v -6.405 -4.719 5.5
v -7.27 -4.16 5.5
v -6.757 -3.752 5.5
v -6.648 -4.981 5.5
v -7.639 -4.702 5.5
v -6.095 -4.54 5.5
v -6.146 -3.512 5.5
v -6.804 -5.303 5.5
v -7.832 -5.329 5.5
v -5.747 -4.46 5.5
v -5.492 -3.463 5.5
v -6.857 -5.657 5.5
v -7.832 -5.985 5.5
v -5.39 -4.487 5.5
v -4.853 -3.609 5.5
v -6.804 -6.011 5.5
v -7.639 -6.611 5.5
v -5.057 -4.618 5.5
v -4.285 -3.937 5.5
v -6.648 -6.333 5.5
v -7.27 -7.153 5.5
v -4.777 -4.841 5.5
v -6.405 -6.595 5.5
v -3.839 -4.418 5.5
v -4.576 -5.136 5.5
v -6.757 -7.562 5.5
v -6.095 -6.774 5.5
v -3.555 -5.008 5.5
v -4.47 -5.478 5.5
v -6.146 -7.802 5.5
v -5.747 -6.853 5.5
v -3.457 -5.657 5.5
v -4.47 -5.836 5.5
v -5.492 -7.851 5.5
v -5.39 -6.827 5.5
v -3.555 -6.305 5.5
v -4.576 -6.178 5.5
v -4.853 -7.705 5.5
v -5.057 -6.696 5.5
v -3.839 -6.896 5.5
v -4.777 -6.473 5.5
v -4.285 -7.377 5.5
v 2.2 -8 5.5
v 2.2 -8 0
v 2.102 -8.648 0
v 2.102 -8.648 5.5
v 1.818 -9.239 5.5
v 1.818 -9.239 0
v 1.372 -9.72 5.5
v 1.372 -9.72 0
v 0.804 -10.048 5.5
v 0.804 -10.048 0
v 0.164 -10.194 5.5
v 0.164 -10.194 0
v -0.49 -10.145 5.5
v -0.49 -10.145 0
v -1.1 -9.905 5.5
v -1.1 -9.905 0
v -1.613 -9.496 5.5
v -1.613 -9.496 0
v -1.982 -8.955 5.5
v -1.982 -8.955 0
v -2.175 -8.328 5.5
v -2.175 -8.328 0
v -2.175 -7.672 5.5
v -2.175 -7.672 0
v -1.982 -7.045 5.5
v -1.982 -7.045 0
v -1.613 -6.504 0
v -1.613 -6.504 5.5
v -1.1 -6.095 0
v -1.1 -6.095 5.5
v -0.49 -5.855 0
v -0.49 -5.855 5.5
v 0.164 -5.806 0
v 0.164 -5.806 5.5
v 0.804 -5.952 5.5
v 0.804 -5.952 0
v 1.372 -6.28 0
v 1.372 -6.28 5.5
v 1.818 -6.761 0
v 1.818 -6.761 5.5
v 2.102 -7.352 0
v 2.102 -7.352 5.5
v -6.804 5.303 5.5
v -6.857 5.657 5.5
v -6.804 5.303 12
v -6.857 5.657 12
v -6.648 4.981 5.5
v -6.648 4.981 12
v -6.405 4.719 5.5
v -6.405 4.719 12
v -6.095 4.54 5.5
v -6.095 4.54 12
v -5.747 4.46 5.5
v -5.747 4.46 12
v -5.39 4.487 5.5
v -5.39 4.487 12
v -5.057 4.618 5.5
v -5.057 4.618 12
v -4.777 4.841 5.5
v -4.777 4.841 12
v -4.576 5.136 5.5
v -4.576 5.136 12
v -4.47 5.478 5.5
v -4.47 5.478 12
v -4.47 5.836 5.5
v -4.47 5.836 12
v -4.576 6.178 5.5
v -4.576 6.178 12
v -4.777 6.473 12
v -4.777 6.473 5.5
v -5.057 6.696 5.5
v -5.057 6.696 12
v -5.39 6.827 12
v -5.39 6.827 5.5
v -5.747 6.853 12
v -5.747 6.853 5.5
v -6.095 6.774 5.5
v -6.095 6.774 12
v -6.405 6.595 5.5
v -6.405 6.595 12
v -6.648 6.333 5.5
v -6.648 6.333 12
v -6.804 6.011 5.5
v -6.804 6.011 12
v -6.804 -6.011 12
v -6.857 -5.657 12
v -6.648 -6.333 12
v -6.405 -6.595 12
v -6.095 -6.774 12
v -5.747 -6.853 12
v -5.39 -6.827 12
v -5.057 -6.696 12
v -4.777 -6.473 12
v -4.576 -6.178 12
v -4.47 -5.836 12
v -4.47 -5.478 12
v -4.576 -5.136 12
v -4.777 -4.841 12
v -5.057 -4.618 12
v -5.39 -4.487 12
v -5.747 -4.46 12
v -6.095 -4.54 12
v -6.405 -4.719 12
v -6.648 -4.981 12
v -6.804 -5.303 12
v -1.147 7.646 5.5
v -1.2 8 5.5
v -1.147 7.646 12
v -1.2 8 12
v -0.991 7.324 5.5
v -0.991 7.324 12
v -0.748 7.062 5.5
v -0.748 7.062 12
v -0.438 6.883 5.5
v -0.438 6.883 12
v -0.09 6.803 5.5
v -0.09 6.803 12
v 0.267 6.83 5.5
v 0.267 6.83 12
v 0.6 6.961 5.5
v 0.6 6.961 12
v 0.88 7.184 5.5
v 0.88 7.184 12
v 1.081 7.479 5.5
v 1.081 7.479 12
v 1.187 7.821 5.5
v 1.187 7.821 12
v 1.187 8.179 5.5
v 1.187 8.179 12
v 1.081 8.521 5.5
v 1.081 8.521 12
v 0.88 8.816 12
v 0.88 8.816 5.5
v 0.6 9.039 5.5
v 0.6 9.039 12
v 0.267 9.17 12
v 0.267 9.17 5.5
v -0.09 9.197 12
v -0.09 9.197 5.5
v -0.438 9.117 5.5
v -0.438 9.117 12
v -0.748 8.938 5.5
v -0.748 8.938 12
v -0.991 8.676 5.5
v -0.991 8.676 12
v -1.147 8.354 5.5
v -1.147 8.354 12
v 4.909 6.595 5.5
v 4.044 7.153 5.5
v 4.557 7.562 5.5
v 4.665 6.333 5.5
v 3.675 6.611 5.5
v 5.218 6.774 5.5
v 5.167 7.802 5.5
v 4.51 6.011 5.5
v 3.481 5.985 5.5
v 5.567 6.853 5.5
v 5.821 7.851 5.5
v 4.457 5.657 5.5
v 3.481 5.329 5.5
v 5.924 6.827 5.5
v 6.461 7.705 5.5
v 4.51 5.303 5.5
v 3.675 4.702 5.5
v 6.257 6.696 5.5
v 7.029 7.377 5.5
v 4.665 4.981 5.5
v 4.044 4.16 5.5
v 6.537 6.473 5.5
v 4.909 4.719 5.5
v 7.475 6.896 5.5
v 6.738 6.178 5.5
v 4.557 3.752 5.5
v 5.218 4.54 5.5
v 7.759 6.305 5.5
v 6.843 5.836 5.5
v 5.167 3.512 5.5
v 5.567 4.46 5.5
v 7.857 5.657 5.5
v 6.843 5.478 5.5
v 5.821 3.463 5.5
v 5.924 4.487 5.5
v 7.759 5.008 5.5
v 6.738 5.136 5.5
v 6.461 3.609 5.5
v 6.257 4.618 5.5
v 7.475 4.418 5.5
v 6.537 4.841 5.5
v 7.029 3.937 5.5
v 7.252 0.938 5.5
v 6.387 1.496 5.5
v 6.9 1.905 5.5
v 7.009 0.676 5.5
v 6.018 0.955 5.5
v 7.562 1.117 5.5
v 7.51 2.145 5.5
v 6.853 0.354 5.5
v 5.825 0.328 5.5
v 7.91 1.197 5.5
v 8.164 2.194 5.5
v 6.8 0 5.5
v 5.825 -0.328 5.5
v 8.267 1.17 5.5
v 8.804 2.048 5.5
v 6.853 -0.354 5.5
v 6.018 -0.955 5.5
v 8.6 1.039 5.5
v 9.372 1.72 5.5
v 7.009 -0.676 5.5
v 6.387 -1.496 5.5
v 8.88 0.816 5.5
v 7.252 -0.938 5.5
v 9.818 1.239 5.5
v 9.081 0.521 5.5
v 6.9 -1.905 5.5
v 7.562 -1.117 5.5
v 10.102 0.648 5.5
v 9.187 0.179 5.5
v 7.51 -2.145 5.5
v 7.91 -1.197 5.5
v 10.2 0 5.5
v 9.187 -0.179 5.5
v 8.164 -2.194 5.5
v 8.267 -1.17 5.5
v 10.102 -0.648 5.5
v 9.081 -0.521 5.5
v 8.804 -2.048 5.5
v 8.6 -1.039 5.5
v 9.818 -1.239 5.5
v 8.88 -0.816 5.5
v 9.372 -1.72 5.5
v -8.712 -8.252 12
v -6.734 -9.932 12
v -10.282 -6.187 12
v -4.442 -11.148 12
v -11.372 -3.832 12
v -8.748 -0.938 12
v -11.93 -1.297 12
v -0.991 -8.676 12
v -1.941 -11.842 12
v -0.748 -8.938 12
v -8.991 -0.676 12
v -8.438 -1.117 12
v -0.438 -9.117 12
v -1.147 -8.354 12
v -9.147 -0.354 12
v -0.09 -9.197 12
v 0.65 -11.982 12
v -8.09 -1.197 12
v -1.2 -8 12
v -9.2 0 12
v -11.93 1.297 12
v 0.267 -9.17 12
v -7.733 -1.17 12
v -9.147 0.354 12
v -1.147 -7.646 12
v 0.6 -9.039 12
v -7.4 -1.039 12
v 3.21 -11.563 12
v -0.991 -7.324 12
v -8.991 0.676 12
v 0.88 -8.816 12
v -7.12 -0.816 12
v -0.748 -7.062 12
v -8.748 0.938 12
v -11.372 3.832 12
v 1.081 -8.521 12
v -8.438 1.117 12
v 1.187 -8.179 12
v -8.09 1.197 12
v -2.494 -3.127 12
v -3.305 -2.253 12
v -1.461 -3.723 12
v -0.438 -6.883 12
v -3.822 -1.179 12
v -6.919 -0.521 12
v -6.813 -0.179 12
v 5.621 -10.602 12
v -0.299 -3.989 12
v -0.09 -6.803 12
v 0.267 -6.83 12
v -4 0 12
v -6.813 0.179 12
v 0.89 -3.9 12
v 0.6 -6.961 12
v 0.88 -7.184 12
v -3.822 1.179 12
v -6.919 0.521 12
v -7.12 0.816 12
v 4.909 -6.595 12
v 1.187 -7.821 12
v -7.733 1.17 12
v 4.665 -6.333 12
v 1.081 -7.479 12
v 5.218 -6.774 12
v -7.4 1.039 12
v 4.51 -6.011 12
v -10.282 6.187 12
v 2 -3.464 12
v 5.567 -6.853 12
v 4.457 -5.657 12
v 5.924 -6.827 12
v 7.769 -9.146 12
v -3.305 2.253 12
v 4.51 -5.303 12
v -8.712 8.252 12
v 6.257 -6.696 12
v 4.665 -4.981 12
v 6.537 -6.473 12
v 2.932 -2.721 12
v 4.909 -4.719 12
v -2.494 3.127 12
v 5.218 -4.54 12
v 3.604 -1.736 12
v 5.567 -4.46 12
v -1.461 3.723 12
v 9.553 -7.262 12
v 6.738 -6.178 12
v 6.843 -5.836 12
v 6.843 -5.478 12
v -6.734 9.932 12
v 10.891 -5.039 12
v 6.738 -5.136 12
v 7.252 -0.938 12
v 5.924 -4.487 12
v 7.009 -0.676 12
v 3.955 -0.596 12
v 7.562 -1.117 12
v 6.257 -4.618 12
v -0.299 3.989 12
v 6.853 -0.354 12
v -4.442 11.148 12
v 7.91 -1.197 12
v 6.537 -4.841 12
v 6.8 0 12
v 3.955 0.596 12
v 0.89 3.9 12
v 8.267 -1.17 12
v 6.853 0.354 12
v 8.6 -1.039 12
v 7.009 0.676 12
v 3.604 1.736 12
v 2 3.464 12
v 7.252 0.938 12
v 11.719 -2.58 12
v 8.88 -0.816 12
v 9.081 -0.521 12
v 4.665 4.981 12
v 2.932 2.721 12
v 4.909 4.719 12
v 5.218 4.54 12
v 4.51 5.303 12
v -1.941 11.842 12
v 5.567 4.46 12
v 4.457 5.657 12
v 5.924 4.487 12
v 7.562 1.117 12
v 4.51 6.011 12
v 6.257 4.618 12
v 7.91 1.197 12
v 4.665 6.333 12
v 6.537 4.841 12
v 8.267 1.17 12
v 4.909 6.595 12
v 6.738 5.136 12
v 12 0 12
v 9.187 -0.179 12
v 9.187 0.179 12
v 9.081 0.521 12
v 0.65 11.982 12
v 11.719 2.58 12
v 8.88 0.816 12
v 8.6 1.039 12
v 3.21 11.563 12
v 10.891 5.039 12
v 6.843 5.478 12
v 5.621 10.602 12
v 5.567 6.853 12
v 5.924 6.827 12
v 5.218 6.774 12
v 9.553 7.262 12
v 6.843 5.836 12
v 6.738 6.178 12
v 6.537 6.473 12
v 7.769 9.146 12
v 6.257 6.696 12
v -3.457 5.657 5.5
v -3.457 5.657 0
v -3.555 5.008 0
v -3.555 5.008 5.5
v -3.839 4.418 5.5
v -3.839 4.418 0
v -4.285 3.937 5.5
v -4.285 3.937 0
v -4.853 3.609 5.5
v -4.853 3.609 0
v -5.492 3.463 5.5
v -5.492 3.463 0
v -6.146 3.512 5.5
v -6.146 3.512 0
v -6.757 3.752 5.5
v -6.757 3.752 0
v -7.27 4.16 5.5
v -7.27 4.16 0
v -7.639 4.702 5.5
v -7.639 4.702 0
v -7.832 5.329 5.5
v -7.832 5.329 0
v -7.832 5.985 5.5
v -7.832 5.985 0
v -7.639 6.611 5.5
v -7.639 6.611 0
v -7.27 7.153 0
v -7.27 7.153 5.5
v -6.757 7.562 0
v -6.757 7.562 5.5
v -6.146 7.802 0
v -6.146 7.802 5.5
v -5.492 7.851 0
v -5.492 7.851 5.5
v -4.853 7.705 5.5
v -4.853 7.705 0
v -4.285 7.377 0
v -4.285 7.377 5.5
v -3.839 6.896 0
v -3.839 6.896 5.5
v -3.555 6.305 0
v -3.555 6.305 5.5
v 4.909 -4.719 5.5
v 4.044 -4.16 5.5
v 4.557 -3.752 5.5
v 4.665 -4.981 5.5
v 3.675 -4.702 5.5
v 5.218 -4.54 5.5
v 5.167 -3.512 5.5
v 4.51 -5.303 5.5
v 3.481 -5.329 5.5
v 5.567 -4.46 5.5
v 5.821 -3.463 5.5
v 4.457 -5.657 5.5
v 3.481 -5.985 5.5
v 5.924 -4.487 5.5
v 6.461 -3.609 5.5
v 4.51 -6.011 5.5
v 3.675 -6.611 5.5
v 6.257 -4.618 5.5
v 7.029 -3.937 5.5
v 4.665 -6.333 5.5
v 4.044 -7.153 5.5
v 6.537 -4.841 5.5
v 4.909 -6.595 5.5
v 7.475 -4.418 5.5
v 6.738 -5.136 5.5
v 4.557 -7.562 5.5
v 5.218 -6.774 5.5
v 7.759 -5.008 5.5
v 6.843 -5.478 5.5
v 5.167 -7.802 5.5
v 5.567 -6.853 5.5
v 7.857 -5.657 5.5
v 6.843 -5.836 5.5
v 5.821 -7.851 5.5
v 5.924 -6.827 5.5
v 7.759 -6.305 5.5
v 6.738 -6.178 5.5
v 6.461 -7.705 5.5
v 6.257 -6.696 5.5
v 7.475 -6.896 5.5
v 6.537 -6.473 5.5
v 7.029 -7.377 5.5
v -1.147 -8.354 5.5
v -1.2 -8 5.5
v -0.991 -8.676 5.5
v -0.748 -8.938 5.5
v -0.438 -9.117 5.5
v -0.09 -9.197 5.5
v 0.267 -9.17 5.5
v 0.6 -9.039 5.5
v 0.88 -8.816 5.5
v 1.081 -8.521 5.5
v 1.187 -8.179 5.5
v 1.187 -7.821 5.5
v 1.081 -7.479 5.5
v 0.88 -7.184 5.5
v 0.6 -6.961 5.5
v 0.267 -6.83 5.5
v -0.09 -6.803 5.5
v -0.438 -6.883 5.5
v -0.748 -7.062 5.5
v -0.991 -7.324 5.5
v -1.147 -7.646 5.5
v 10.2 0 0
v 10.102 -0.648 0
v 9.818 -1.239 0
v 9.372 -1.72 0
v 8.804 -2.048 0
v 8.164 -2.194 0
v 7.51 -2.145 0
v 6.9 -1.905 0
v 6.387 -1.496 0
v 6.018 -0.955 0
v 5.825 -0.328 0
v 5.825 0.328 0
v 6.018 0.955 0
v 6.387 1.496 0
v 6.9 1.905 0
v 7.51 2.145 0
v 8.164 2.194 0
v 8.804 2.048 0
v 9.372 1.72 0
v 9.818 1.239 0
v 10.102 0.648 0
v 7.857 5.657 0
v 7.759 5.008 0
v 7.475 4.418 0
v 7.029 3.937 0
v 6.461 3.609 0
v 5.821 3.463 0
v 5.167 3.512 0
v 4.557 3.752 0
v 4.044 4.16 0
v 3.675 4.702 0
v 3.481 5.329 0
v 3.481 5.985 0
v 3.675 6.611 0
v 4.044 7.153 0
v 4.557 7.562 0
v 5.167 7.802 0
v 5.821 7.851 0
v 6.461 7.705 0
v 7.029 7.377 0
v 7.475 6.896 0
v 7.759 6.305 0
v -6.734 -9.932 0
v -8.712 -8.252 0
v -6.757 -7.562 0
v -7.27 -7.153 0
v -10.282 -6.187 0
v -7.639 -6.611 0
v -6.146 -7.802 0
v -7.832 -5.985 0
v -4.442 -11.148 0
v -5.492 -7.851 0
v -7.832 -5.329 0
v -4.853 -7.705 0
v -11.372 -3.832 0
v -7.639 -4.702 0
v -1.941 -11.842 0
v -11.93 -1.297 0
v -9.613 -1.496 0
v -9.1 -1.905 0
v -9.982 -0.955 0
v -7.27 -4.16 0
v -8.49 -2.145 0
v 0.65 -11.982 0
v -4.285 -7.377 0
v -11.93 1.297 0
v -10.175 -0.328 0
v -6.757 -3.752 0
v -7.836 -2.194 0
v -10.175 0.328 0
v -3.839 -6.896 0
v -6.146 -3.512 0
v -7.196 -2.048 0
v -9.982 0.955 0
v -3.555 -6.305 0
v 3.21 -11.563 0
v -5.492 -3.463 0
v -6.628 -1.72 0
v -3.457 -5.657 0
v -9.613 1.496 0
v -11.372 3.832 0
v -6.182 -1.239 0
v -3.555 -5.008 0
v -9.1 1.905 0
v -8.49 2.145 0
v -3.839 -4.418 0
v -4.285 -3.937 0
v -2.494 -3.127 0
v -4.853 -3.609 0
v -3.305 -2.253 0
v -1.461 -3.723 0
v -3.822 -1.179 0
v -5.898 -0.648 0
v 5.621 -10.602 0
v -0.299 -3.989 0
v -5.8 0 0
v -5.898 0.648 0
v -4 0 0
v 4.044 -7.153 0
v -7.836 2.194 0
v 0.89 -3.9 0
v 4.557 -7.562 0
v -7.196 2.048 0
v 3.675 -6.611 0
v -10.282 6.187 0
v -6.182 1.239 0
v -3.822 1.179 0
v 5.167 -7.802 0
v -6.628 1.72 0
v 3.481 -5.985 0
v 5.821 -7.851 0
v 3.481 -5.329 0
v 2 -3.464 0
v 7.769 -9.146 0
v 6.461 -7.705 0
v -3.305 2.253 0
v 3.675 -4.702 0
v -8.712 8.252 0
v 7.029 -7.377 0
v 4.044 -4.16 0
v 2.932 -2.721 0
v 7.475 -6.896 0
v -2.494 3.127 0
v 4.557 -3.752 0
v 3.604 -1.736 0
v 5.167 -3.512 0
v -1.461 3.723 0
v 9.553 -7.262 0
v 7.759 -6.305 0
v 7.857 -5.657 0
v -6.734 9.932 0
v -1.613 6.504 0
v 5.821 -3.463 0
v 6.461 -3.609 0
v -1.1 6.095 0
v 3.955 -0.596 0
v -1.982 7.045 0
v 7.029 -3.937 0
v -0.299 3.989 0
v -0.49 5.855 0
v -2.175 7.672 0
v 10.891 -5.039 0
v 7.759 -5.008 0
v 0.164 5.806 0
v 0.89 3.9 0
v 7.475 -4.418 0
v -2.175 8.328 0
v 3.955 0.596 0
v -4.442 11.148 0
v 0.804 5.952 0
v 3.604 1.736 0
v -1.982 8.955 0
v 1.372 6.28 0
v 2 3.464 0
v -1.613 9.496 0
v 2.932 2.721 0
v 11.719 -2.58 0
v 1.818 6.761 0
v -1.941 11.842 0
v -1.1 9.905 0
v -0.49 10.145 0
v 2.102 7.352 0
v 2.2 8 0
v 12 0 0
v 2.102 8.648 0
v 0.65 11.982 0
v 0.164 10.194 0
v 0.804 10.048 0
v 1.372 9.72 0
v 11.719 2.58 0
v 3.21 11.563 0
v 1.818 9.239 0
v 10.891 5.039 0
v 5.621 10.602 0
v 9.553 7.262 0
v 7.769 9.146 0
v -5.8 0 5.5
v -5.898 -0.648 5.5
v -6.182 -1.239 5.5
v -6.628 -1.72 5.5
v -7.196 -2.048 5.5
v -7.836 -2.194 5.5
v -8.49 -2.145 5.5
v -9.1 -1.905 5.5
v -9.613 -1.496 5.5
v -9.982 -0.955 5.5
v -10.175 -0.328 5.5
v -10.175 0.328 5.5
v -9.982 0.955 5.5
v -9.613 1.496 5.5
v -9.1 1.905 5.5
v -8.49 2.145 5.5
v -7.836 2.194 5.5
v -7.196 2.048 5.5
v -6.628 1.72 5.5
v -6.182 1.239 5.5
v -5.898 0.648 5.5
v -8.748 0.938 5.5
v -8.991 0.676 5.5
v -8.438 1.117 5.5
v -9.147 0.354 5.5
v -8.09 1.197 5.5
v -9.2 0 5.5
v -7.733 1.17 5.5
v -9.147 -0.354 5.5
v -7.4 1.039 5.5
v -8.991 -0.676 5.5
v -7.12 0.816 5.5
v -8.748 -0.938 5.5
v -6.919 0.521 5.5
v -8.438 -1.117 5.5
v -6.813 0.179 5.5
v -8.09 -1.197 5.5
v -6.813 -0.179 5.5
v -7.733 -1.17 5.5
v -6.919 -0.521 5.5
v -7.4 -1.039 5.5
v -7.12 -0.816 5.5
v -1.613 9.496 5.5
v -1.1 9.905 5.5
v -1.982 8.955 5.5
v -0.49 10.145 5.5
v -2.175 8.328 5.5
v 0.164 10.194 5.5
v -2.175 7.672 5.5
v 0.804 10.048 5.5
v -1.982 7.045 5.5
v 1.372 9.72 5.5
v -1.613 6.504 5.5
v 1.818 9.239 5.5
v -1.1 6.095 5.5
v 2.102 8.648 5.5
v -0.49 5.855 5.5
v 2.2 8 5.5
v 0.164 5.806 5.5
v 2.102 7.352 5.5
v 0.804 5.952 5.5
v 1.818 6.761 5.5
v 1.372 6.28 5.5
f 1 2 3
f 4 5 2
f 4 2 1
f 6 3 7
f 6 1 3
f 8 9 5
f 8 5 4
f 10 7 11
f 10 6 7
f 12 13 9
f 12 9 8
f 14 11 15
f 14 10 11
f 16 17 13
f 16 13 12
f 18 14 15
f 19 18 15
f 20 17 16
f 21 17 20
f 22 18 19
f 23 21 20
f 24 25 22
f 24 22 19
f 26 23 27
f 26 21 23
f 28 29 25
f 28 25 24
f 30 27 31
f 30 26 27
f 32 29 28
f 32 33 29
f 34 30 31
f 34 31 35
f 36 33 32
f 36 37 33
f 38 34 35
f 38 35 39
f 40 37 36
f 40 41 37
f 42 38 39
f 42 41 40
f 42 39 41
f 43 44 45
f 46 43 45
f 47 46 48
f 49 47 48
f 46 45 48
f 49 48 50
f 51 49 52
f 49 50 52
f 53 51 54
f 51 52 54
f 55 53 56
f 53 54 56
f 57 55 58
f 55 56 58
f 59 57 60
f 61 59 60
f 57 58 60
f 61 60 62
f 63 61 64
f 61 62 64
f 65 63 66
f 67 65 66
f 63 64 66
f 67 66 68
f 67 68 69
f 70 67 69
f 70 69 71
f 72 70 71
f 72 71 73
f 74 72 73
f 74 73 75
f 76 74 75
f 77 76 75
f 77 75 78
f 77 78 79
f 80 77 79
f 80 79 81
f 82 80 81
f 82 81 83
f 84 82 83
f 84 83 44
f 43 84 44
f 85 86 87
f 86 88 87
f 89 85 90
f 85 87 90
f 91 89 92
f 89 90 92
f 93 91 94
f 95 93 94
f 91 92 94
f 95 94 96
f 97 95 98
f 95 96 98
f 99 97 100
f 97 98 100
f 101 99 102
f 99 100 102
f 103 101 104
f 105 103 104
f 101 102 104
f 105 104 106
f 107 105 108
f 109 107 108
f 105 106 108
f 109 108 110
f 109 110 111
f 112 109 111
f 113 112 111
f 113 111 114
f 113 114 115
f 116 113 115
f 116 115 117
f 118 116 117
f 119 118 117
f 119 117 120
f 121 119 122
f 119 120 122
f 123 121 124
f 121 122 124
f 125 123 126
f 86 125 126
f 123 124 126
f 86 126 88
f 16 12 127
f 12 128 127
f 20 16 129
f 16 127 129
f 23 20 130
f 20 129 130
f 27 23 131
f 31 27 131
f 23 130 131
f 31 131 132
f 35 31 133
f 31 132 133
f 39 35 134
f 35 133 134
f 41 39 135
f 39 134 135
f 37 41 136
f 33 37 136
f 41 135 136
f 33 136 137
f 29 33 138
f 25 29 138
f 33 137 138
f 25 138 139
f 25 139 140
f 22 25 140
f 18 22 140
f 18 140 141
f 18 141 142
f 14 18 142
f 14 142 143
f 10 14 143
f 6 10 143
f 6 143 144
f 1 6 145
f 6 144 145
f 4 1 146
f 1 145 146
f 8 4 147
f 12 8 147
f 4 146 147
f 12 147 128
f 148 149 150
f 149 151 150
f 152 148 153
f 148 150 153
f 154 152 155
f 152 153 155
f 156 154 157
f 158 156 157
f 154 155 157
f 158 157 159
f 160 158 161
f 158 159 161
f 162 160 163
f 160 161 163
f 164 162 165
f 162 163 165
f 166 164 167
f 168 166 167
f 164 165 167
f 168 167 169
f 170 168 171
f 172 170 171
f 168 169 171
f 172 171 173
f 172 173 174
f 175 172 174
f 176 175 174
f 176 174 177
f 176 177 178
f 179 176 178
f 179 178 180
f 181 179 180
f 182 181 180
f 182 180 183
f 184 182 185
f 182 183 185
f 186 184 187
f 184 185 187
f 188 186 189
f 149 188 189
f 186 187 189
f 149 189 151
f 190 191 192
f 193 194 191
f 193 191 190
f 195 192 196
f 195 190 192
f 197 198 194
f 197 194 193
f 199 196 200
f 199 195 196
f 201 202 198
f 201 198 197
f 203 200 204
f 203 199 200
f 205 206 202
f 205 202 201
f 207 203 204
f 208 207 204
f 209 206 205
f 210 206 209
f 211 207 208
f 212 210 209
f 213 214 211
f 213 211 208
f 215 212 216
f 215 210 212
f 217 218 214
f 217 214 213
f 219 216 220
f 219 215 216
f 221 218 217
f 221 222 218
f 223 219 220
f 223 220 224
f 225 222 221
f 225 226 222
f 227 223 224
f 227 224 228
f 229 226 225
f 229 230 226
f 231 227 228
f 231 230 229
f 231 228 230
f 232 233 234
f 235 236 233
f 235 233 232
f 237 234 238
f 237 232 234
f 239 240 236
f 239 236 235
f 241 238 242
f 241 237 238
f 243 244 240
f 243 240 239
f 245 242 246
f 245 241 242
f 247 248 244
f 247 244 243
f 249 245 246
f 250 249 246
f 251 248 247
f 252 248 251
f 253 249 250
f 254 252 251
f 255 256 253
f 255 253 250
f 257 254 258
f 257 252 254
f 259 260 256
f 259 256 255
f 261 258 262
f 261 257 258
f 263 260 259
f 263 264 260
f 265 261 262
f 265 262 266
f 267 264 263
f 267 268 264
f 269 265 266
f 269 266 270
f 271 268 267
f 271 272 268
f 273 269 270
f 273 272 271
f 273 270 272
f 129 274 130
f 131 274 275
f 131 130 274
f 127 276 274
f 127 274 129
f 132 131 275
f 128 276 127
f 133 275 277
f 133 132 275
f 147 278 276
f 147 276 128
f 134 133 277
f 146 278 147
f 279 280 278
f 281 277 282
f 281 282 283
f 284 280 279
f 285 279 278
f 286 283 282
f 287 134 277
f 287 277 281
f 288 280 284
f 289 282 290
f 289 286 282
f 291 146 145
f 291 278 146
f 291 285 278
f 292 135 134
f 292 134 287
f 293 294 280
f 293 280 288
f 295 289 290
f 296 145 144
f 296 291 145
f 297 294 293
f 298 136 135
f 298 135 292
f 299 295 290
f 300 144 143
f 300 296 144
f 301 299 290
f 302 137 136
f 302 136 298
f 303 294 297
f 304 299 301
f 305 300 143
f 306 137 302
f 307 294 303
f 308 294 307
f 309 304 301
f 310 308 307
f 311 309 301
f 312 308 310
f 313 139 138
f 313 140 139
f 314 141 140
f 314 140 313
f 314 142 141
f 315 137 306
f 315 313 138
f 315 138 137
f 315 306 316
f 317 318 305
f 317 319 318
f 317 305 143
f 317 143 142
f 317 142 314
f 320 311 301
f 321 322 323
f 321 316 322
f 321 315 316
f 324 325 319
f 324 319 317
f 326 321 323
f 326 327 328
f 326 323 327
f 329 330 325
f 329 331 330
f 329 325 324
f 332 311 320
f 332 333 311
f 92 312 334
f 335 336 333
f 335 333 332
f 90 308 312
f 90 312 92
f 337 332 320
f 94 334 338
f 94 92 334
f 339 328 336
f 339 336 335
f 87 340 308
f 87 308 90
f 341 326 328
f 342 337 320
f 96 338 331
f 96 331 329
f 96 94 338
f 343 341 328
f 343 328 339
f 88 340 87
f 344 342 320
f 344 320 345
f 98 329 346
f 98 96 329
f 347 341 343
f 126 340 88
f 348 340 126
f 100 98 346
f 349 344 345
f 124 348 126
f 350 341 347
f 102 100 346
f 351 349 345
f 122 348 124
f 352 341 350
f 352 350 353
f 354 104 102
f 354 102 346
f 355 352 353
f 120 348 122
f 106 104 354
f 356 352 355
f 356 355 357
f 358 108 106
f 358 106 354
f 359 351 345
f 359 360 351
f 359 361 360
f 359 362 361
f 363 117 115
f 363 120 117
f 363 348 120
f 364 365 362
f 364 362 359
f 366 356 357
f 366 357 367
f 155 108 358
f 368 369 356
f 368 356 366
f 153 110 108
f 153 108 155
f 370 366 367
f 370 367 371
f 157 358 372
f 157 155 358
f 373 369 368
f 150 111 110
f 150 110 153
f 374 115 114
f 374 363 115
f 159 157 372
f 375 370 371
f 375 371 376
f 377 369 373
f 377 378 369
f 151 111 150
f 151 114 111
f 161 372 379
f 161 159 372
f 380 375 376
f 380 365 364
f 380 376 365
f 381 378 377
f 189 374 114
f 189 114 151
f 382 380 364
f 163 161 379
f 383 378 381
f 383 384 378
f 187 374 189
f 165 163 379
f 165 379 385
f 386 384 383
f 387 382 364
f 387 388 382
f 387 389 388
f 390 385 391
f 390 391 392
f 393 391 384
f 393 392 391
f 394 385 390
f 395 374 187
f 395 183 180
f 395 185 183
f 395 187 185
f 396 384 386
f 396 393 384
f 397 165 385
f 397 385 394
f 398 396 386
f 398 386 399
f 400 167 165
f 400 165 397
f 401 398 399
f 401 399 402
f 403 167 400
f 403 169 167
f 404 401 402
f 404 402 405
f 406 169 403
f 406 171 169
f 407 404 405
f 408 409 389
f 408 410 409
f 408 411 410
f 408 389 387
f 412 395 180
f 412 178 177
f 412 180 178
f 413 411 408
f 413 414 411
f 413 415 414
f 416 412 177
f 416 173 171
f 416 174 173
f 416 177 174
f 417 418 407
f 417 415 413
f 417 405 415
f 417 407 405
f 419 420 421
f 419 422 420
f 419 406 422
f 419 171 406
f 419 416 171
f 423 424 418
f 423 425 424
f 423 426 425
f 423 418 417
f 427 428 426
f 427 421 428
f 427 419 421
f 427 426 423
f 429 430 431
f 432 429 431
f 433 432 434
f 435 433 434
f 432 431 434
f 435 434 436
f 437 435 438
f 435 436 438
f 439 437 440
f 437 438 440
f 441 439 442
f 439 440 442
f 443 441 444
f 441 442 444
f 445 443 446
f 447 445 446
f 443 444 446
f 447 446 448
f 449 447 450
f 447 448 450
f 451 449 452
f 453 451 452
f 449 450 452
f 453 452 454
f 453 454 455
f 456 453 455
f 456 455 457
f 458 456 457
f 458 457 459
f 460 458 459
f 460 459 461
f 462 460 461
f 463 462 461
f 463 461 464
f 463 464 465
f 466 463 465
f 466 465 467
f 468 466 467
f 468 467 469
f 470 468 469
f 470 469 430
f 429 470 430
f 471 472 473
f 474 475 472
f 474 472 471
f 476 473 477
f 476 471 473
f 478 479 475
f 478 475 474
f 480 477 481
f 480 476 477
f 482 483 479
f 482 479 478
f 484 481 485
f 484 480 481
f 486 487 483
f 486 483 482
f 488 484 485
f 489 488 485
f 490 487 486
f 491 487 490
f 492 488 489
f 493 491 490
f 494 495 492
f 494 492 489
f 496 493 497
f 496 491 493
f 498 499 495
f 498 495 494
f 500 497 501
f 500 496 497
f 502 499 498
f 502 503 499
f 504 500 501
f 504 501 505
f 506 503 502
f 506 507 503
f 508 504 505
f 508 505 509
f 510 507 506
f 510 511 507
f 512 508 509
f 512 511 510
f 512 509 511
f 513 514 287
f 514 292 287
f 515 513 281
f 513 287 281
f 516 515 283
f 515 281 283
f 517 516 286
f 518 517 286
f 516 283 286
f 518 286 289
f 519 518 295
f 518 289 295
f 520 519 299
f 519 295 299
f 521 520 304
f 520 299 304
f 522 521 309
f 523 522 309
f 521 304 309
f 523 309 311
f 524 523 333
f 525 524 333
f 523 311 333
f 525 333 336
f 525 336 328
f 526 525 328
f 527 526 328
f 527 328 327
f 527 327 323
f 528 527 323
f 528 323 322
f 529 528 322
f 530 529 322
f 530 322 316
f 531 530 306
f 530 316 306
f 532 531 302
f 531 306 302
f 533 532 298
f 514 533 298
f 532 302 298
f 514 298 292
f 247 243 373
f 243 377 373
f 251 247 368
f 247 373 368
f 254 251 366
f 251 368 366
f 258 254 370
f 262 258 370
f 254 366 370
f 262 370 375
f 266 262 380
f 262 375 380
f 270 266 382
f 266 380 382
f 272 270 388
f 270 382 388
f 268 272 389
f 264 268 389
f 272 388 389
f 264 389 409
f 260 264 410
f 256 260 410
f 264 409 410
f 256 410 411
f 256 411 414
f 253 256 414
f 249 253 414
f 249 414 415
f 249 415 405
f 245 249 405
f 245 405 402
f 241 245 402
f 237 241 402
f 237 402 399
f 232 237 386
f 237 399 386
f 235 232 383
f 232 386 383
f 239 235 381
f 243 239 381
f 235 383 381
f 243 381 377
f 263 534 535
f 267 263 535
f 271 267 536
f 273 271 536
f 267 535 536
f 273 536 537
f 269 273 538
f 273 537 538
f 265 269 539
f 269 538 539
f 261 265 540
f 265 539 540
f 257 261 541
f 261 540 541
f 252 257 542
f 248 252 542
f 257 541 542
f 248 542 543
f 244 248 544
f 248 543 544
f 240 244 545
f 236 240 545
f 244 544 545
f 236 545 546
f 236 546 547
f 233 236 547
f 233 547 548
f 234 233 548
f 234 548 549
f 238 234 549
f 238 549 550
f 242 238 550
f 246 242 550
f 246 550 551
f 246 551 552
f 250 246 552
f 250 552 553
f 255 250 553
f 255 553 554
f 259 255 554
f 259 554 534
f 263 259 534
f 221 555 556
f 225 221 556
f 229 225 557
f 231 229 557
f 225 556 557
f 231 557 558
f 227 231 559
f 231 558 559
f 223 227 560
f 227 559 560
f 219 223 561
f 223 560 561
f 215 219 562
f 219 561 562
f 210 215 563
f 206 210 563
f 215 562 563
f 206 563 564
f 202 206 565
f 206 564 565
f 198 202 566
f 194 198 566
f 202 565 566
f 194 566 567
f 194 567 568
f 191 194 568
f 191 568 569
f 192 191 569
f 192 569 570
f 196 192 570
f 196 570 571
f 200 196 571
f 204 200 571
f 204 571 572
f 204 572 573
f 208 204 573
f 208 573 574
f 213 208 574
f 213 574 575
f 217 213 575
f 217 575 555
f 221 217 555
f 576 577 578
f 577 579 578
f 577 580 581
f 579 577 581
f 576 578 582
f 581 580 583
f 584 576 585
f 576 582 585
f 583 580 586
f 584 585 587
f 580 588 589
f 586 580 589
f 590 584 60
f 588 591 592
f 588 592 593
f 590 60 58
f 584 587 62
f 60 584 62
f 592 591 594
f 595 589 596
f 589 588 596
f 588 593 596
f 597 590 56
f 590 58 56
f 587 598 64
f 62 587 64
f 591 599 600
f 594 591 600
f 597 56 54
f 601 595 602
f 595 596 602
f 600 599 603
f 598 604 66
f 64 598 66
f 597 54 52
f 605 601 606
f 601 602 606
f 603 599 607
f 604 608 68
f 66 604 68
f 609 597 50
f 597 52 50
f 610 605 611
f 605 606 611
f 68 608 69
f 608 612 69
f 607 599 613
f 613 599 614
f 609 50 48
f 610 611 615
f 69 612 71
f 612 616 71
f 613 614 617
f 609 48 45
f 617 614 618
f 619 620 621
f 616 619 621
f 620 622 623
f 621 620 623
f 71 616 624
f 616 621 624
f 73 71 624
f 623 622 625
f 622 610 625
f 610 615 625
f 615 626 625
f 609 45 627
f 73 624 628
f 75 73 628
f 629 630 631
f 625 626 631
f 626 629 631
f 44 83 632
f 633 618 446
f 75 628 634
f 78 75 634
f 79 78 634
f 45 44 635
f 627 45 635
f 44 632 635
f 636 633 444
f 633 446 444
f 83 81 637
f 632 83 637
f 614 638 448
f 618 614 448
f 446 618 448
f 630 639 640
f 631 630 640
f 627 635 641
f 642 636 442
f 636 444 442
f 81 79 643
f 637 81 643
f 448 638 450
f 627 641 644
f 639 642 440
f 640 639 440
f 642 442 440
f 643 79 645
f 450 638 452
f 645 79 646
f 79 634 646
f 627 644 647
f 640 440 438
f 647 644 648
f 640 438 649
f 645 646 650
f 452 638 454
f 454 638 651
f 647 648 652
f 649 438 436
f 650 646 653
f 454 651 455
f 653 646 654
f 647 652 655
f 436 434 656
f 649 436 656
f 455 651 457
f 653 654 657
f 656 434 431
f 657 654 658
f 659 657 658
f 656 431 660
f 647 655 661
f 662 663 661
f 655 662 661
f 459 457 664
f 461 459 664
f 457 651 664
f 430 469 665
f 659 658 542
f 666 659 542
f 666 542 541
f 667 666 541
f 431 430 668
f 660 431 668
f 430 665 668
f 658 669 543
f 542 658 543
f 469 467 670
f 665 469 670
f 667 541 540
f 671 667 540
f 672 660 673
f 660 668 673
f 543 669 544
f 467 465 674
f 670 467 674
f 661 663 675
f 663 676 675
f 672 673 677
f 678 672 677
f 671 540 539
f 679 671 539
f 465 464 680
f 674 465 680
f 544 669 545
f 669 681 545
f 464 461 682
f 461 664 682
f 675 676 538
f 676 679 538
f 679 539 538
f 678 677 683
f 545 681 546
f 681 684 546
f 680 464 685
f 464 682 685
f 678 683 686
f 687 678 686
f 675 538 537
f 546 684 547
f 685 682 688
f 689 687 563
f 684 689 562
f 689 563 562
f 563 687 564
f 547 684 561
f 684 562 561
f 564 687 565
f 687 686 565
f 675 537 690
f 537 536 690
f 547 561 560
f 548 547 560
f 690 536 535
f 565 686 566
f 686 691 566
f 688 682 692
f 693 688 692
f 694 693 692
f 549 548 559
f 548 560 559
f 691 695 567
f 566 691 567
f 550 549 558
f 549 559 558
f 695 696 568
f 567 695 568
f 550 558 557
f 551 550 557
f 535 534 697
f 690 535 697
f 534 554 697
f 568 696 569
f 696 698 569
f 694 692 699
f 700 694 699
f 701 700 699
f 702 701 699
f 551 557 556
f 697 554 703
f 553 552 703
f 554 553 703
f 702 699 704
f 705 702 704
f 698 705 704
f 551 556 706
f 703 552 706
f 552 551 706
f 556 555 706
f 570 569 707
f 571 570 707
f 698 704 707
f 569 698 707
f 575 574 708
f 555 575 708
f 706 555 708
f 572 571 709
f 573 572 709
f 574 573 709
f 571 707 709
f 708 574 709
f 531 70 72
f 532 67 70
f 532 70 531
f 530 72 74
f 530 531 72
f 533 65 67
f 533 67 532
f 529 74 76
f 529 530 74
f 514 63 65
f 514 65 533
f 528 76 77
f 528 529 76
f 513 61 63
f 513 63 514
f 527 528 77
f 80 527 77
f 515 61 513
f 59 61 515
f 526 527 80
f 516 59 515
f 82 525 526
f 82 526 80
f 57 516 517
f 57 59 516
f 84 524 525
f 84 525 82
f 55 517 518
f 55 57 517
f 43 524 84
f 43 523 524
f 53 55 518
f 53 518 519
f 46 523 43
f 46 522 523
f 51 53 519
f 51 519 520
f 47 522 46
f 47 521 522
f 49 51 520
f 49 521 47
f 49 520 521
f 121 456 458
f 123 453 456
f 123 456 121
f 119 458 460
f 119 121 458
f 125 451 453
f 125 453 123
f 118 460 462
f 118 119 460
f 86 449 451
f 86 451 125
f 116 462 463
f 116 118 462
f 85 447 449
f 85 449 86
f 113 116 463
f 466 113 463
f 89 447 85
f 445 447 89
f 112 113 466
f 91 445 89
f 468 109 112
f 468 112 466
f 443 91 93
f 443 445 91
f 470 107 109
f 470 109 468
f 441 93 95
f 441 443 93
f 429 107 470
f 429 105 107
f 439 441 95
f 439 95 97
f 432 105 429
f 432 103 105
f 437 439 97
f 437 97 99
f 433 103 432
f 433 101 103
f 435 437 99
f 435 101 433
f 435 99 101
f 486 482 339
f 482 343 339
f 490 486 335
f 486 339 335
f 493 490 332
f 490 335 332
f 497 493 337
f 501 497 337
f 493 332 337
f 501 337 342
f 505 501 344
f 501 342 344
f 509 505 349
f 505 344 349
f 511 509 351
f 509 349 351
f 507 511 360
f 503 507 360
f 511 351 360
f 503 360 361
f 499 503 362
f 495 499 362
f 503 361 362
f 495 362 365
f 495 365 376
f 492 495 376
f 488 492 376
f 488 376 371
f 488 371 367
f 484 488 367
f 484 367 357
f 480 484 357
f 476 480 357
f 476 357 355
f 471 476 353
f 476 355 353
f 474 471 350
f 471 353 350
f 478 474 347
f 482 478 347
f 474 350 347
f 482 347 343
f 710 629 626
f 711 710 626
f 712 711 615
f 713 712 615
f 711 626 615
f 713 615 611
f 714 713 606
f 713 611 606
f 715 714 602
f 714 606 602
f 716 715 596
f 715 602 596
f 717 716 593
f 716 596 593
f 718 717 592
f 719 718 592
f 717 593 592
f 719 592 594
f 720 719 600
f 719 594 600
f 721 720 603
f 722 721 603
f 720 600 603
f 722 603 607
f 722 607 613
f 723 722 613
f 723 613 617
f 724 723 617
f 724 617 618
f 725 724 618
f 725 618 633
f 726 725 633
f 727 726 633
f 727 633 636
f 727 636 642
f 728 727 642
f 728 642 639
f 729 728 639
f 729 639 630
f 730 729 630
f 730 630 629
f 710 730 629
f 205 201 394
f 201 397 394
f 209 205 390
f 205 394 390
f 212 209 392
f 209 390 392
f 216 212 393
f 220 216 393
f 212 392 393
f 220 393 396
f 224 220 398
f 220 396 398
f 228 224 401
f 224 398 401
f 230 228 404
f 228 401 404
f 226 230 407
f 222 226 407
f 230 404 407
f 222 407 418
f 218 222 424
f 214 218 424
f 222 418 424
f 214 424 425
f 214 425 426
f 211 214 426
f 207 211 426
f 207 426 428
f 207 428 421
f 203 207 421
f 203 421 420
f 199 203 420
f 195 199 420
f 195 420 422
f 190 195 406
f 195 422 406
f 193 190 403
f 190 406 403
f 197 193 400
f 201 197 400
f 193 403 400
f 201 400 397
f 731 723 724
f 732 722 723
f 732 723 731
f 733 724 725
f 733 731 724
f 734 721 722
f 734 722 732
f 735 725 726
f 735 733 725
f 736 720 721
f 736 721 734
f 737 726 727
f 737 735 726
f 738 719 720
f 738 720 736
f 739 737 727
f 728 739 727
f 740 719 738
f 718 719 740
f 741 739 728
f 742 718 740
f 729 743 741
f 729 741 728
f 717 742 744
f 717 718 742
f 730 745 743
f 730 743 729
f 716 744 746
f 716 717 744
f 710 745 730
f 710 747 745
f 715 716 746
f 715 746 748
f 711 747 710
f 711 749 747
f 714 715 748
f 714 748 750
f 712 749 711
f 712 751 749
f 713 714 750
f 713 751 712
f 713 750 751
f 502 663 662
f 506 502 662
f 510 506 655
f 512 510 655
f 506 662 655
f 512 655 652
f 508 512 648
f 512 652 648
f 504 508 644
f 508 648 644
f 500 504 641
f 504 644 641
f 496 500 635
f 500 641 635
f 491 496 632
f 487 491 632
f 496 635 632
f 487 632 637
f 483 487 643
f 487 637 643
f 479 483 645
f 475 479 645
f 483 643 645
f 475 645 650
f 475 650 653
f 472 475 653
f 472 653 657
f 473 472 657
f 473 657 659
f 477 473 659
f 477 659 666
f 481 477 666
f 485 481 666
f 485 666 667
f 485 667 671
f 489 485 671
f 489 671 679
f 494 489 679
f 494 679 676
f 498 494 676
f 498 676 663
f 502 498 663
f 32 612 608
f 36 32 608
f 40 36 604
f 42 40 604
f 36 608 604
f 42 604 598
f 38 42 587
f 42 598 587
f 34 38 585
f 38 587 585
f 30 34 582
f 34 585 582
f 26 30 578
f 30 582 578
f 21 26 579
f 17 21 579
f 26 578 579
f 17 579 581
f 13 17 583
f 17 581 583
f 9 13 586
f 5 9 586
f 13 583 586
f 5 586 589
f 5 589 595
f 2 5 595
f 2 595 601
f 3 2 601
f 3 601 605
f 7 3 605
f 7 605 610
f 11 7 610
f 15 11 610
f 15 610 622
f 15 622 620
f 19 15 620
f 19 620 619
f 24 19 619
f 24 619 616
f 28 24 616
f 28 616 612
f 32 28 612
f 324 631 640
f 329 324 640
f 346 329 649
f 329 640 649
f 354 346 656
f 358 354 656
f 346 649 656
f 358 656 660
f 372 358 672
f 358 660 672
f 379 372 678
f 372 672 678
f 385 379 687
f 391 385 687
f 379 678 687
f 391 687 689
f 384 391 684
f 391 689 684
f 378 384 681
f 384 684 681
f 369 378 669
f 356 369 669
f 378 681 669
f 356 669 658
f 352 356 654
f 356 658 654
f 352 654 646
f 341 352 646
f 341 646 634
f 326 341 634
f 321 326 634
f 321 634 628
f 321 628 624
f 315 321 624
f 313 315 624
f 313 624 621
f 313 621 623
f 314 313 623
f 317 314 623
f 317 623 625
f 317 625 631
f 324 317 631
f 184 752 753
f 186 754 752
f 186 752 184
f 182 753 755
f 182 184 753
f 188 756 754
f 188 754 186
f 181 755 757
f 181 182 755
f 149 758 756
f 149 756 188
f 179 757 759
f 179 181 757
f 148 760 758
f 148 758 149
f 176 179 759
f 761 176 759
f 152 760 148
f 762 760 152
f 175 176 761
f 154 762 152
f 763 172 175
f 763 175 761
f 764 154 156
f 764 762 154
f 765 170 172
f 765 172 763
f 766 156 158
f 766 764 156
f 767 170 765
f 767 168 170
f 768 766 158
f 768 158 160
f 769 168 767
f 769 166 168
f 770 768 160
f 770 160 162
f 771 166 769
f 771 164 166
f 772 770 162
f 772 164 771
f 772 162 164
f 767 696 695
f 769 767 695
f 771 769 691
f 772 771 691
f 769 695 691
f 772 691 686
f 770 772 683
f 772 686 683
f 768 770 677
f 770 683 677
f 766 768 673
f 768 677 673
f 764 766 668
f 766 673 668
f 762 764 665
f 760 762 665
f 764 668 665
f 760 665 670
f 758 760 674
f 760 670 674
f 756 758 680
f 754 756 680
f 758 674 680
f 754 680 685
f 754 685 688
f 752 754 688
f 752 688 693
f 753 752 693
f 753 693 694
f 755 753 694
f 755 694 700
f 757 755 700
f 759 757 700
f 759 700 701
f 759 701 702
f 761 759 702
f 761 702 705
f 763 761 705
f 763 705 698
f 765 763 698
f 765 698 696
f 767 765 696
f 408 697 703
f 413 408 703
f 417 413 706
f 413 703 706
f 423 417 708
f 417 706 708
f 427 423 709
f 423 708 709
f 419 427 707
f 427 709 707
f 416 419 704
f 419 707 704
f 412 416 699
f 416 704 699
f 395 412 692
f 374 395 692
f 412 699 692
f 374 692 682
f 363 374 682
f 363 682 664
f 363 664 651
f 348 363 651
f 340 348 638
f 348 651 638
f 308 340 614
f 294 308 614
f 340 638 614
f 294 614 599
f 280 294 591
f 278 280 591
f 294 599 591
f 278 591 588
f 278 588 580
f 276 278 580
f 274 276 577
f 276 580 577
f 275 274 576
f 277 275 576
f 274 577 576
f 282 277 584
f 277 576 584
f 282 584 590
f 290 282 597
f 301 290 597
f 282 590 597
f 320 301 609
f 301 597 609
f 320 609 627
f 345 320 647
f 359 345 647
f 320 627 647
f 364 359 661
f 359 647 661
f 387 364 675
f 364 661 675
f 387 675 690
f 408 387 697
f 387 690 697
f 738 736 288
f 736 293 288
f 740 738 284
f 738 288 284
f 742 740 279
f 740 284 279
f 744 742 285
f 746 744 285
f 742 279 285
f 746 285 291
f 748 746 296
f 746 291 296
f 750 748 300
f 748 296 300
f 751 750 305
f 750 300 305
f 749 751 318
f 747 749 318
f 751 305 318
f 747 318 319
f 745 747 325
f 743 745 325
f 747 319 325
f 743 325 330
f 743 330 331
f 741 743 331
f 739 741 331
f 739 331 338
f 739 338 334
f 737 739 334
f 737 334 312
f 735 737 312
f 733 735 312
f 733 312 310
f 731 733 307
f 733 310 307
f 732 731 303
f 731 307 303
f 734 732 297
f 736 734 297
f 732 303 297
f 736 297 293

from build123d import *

# Parameters (mm, degrees)
SKETCH1_R                                           = 12
BOSS_EXTRUDE1_DEPTH                                 = 12
F_8_0MM_DOWEL_HOLE1_D                               = 8
CBORE_FOR_M2_HEX_SOCKET_HEAD_CAP_SCREW1_D           = 2.4
CBORE_FOR_M2_HEX_SOCKET_HEAD_CAP_SCREW1_CBORE_D     = 4.4
CBORE_FOR_M2_HEX_SOCKET_HEAD_CAP_SCREW1_CBORE_DEPTH = 5.5


with BuildPart() as part:
    # Sketch1 → Boss-Extrude1 (new body)
    with BuildSketch(Plane.XY):
        Circle(SKETCH1_R)
    extrude(amount=BOSS_EXTRUDE1_DEPTH)

    # Ø8.0mm Dowel Hole1 (through all)
    with Locations(Plane.XY.offset(12)):
        with Locations((0, 0)):
            Hole(F_8_0MM_DOWEL_HOLE1_D / 2)

    # CBORE for M2 Hex Socket Head Cap Screw1 (through all)
    with Locations(Plane(origin=(0, 0, 0), x_dir=(1, 0, 0), z_dir=(0, 0, -1))):
        with Locations((-5.656854249, -5.656854249), (0, -8), (5.656854249, -5.656854249), (8, 0), (5.656854249, 5.656854249), (0, 8), (-5.656854249, 5.656854249), (-8, 0)):
            CounterBoreHole(CBORE_FOR_M2_HEX_SOCKET_HEAD_CAP_SCREW1_D / 2, CBORE_FOR_M2_HEX_SOCKET_HEAD_CAP_SCREW1_CBORE_D / 2, CBORE_FOR_M2_HEX_SOCKET_HEAD_CAP_SCREW1_CBORE_DEPTH)


solid = part.part
